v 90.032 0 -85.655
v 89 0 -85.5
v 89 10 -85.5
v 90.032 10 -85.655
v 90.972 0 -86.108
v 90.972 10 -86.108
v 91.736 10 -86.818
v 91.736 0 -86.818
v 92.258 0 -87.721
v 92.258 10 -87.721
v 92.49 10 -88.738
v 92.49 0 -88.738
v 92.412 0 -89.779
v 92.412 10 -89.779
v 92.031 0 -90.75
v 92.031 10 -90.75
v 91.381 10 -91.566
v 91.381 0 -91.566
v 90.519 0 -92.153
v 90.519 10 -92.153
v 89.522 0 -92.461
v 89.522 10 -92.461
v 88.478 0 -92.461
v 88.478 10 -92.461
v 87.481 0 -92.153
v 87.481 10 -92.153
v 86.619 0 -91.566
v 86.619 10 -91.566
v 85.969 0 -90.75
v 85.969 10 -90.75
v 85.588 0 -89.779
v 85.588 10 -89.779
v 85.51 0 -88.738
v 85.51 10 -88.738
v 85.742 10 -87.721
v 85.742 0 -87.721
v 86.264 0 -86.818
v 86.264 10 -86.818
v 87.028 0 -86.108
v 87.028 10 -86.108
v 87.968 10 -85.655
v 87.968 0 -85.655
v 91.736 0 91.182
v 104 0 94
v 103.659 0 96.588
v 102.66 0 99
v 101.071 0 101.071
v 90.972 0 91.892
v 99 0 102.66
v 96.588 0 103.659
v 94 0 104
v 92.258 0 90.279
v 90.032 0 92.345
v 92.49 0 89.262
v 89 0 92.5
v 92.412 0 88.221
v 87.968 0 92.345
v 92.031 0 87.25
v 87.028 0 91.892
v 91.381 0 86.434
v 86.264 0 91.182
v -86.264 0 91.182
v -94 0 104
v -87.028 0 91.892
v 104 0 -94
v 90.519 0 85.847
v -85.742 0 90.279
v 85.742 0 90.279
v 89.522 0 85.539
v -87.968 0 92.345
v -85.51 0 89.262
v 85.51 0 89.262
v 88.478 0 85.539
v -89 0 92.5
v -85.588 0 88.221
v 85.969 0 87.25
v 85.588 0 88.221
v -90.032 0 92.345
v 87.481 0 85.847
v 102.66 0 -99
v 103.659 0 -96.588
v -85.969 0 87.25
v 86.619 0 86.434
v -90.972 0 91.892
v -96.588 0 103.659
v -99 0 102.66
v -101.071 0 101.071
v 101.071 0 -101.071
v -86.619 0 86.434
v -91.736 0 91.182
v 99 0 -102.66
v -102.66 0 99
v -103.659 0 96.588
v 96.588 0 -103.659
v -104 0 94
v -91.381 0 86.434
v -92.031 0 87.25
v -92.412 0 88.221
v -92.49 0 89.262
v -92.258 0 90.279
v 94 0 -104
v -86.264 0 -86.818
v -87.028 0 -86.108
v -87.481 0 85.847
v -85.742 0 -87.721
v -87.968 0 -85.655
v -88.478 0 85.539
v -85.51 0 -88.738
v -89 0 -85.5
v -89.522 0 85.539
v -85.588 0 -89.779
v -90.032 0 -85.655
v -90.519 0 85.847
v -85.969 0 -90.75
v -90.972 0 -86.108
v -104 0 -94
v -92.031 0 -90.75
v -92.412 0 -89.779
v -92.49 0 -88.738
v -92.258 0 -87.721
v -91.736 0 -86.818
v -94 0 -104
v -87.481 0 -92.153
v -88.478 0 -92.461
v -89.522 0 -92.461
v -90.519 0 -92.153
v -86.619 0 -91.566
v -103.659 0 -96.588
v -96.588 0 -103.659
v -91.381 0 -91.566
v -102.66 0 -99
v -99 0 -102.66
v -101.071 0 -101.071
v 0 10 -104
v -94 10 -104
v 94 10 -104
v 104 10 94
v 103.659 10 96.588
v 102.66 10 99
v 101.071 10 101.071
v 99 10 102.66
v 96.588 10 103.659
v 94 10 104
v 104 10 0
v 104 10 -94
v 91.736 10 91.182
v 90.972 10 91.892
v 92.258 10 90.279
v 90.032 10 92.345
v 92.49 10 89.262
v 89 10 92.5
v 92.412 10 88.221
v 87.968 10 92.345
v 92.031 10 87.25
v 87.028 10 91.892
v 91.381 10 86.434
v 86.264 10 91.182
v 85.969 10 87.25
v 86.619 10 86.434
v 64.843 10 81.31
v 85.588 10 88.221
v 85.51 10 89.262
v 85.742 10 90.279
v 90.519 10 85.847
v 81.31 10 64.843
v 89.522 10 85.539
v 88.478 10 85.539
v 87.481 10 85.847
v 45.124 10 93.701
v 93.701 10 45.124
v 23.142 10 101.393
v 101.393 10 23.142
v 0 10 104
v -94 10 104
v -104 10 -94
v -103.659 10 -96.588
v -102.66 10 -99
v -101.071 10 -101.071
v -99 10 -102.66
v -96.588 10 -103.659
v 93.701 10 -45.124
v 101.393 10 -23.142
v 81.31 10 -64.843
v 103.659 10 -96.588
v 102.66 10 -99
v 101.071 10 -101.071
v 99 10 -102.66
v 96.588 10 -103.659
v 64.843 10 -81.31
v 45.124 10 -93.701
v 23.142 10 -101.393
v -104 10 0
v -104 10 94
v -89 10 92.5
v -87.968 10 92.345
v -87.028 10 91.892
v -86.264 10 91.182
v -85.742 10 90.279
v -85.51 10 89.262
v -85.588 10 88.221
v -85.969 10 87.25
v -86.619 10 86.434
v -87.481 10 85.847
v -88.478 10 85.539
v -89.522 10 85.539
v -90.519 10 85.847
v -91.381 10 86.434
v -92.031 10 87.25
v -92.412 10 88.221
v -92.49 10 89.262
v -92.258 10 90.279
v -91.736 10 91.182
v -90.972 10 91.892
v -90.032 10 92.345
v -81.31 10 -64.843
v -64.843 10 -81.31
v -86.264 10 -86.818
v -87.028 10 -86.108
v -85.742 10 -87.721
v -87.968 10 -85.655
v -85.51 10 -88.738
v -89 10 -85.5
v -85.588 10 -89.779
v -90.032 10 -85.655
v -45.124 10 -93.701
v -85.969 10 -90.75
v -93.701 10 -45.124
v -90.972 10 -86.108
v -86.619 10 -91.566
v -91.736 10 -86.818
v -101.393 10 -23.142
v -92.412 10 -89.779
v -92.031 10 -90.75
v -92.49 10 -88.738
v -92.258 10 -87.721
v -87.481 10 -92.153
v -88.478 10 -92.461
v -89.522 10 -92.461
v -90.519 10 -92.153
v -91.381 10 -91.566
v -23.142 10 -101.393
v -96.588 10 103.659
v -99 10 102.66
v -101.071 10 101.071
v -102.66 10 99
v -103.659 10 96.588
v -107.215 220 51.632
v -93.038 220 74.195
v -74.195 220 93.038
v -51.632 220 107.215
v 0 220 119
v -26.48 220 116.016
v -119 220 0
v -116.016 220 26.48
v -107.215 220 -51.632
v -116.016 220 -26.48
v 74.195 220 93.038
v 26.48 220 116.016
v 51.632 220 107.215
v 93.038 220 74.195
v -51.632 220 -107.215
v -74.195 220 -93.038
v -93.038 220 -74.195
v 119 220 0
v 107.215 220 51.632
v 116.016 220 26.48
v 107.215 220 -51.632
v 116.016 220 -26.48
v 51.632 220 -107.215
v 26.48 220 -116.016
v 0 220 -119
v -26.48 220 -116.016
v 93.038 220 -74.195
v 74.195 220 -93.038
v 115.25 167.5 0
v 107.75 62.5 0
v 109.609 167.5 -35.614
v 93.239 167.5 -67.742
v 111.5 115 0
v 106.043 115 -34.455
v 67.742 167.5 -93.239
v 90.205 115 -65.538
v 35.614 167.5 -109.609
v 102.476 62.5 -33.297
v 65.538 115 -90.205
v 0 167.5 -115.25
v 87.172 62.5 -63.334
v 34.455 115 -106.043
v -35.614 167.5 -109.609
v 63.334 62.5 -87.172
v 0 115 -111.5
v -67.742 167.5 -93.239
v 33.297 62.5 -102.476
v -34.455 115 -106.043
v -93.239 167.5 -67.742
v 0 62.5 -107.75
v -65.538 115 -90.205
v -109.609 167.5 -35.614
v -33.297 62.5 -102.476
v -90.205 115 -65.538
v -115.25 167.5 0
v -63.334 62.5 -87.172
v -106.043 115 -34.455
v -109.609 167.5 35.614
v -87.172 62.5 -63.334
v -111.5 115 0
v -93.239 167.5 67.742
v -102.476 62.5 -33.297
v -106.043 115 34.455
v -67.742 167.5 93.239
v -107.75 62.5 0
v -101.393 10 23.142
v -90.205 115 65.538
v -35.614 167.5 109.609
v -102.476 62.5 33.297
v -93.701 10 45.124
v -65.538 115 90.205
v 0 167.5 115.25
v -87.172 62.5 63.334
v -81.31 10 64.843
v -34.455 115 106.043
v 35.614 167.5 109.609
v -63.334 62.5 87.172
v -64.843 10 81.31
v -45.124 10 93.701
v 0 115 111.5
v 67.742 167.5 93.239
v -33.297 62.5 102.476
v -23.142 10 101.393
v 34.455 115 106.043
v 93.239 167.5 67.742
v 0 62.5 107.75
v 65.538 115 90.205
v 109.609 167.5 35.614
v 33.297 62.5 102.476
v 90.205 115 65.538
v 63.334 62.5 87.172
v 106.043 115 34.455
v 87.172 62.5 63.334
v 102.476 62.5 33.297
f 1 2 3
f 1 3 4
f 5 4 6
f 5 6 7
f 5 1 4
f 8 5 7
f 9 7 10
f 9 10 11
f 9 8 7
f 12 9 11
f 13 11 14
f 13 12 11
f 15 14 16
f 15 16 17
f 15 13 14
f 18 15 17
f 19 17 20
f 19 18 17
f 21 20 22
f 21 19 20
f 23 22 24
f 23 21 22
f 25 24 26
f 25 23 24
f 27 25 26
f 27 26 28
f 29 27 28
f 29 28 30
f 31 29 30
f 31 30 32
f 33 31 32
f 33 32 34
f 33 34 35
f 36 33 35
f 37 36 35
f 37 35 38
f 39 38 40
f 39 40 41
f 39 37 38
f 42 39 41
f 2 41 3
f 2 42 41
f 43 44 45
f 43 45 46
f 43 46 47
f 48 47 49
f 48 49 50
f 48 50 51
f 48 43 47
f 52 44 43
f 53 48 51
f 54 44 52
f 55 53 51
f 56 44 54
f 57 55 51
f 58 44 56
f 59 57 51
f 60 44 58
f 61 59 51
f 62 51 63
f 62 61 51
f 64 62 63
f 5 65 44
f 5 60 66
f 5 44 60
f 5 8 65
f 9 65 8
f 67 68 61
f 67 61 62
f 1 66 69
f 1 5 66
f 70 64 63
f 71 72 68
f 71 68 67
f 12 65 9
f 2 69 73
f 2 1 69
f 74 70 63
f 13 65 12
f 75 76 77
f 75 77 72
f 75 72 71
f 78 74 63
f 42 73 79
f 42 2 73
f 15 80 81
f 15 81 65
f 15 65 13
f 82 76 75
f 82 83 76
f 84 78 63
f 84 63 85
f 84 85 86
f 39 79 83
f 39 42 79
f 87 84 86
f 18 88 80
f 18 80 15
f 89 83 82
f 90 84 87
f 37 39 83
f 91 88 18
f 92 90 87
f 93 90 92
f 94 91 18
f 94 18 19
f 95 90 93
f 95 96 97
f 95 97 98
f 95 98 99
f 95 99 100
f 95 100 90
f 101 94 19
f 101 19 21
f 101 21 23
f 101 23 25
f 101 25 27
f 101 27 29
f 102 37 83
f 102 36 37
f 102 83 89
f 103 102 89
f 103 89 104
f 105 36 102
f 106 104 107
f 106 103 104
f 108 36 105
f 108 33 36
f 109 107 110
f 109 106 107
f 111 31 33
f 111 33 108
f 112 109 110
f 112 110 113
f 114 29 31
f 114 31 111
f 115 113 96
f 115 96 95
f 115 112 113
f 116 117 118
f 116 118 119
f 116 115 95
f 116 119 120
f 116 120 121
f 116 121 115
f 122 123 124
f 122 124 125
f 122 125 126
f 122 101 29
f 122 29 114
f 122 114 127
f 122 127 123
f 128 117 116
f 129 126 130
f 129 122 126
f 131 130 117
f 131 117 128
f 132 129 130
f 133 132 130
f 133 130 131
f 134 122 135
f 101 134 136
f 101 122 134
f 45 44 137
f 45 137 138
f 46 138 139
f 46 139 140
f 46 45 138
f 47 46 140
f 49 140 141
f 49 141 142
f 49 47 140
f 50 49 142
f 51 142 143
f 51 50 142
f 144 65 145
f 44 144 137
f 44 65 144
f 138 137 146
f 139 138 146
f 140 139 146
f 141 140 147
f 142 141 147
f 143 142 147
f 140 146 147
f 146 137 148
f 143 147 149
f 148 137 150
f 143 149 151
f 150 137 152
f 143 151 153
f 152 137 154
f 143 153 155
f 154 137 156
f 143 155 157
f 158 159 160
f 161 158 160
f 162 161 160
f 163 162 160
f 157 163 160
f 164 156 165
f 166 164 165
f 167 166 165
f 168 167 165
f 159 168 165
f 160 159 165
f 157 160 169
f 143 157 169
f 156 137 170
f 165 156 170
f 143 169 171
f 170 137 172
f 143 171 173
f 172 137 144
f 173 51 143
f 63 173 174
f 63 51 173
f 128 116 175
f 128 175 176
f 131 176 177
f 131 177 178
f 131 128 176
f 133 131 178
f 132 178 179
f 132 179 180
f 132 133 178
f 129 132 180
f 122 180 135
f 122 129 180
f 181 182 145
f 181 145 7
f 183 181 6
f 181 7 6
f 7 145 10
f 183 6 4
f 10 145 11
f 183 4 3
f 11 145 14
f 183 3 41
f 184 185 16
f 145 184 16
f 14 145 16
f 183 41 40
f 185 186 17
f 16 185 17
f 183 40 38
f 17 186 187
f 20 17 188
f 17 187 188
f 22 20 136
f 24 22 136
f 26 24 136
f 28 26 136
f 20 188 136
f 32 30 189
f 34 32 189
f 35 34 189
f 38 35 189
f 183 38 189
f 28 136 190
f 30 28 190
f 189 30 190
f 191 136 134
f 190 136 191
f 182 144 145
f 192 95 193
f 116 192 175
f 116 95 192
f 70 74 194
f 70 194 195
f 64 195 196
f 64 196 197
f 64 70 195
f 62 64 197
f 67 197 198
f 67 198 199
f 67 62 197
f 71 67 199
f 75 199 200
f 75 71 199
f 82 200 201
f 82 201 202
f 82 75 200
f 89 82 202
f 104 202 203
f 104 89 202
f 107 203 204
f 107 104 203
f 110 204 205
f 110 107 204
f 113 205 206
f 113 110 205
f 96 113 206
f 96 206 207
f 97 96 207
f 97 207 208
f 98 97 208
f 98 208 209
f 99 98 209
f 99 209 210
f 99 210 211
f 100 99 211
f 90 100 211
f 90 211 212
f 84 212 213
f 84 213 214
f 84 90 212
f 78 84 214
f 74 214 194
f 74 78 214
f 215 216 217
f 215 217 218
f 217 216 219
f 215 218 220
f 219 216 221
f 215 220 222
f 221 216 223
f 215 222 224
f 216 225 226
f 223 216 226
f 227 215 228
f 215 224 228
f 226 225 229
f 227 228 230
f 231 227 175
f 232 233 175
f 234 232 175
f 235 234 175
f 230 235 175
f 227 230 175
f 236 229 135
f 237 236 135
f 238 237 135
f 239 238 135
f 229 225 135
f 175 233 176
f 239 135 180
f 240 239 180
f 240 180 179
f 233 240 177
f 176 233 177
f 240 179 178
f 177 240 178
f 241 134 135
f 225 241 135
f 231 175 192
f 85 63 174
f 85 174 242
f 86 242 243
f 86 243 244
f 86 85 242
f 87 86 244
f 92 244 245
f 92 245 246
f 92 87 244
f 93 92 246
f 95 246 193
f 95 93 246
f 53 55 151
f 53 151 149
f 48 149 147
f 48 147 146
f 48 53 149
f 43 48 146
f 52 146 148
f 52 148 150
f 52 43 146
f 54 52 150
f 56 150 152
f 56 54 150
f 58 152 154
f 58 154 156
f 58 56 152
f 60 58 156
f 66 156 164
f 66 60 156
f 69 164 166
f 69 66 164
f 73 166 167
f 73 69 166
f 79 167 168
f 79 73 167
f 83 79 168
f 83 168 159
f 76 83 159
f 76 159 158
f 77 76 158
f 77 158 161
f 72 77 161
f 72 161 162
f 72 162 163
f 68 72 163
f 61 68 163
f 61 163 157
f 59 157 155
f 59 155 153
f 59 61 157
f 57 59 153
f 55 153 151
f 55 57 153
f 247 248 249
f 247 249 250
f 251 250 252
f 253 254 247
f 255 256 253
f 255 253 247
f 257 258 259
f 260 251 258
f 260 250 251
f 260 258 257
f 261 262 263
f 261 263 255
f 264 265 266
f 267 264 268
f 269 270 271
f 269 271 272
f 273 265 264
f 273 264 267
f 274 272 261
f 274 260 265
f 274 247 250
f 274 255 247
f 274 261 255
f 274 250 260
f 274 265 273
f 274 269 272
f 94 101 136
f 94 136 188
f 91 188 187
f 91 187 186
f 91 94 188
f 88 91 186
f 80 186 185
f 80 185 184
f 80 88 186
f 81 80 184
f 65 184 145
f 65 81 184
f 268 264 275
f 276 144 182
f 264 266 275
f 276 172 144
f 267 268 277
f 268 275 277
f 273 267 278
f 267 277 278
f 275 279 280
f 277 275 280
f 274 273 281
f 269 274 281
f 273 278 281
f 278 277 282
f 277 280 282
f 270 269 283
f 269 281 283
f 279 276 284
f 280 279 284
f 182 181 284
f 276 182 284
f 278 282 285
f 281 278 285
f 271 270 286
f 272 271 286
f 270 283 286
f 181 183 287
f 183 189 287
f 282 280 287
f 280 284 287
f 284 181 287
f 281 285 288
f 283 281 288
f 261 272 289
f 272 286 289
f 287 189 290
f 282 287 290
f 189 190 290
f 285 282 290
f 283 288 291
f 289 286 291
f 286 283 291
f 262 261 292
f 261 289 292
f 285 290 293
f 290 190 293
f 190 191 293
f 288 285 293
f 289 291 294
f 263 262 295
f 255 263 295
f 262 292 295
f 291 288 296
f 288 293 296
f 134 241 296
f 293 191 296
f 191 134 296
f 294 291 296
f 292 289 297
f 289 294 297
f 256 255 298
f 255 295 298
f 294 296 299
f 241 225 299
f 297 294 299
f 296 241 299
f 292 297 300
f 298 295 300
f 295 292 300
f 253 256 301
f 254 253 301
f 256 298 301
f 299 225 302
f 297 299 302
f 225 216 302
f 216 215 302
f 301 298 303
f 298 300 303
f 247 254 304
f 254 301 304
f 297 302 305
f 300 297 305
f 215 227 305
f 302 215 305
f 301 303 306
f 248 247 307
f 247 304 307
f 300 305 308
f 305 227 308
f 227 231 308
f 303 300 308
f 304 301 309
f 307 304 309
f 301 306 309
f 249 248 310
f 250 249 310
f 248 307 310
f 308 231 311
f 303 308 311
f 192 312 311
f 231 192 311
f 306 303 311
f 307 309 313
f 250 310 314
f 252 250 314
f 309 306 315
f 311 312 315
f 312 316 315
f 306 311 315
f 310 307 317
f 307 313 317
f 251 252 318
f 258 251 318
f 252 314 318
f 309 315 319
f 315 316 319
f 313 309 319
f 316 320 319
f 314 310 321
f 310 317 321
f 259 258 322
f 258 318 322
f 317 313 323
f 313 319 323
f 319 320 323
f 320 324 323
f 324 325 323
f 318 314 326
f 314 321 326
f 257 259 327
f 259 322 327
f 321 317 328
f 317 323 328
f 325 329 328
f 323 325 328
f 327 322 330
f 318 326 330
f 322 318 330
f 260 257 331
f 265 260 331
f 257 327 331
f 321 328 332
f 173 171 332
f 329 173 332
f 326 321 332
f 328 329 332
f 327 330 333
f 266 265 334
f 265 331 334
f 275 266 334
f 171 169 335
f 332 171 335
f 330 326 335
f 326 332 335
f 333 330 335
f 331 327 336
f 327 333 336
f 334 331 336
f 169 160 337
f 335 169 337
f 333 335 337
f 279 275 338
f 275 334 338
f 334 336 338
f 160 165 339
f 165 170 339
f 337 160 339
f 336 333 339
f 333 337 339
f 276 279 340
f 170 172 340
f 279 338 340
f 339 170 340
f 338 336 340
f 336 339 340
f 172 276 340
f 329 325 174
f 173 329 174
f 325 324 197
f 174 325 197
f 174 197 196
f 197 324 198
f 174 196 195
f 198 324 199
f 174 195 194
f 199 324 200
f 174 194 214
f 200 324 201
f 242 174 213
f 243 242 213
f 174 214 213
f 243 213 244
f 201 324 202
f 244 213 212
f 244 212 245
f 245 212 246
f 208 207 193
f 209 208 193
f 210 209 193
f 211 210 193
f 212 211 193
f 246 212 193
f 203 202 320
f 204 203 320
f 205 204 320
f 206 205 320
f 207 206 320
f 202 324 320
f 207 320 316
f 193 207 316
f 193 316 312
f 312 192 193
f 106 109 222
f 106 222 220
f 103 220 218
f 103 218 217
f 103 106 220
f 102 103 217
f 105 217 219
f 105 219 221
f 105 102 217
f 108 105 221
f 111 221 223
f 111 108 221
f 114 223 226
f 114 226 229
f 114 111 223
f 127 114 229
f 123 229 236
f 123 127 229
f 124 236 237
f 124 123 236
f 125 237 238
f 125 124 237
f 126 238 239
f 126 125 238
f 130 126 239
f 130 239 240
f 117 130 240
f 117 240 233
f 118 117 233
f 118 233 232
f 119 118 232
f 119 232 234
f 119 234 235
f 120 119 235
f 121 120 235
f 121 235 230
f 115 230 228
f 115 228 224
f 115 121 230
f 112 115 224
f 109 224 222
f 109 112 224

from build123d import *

# Parameters (mm, degrees)
SKETCH2_R           = 3.5
BOSS_EXTRUDE1_DEPTH = 10
SKETCH4_R           = 119
SKETCH3_R           = 104


with BuildPart() as part:
    # Sketch2 → Boss-Extrude1 (new body)
    with BuildSketch(Plane(origin=(0, 0, 0), x_dir=(1, 0, 0), z_dir=(0, 1, 0))):
        with BuildLine():
            Line((-94, 104), (94, 104))
            ThreePointArc((94, 104), (101.071067812, 101.071067812), (104, 94))
            Line((104, 94), (104, -94))
            ThreePointArc((104, -94), (101.071067812, -101.071067812), (94, -104))
            Line((94, -104), (-94, -104))
            ThreePointArc((-94, -104), (-101.071067812, -101.071067812), (-104, -94))
            Line((-104, -94), (-104, 94))
            ThreePointArc((-104, 94), (-101.071067812, 101.071067812), (-94, 104))
        make_face()
        with Locations(Location((-89, 89, 0), (0, 0, 270))):
            Circle(SKETCH2_R, mode=Mode.SUBTRACT)
        with Locations(Location((89, 89, 0), (0, 0, 270))):
            Circle(SKETCH2_R, mode=Mode.SUBTRACT)
        with Locations(Location((89, -89, 0), (0, 0, 270))):
            Circle(SKETCH2_R, mode=Mode.SUBTRACT)
        with Locations(Location((-89, -89, 0), (0, 0, 270))):
            Circle(SKETCH2_R, mode=Mode.SUBTRACT)
    extrude(amount=BOSS_EXTRUDE1_DEPTH)

    # Sketch4 → Loft1 section 0
    with BuildSketch(Plane(origin=(0, 220, 0), x_dir=(1, 0, 0), z_dir=(0, 1, 0))):
        Circle(SKETCH4_R)
    # Sketch3 → Loft1 section 1
    with BuildSketch(Plane(origin=(0, 10, 0), x_dir=(1, 0, 0), z_dir=(0, 1, 0))):
        Circle(SKETCH3_R)
    loft()


solid = part.part
